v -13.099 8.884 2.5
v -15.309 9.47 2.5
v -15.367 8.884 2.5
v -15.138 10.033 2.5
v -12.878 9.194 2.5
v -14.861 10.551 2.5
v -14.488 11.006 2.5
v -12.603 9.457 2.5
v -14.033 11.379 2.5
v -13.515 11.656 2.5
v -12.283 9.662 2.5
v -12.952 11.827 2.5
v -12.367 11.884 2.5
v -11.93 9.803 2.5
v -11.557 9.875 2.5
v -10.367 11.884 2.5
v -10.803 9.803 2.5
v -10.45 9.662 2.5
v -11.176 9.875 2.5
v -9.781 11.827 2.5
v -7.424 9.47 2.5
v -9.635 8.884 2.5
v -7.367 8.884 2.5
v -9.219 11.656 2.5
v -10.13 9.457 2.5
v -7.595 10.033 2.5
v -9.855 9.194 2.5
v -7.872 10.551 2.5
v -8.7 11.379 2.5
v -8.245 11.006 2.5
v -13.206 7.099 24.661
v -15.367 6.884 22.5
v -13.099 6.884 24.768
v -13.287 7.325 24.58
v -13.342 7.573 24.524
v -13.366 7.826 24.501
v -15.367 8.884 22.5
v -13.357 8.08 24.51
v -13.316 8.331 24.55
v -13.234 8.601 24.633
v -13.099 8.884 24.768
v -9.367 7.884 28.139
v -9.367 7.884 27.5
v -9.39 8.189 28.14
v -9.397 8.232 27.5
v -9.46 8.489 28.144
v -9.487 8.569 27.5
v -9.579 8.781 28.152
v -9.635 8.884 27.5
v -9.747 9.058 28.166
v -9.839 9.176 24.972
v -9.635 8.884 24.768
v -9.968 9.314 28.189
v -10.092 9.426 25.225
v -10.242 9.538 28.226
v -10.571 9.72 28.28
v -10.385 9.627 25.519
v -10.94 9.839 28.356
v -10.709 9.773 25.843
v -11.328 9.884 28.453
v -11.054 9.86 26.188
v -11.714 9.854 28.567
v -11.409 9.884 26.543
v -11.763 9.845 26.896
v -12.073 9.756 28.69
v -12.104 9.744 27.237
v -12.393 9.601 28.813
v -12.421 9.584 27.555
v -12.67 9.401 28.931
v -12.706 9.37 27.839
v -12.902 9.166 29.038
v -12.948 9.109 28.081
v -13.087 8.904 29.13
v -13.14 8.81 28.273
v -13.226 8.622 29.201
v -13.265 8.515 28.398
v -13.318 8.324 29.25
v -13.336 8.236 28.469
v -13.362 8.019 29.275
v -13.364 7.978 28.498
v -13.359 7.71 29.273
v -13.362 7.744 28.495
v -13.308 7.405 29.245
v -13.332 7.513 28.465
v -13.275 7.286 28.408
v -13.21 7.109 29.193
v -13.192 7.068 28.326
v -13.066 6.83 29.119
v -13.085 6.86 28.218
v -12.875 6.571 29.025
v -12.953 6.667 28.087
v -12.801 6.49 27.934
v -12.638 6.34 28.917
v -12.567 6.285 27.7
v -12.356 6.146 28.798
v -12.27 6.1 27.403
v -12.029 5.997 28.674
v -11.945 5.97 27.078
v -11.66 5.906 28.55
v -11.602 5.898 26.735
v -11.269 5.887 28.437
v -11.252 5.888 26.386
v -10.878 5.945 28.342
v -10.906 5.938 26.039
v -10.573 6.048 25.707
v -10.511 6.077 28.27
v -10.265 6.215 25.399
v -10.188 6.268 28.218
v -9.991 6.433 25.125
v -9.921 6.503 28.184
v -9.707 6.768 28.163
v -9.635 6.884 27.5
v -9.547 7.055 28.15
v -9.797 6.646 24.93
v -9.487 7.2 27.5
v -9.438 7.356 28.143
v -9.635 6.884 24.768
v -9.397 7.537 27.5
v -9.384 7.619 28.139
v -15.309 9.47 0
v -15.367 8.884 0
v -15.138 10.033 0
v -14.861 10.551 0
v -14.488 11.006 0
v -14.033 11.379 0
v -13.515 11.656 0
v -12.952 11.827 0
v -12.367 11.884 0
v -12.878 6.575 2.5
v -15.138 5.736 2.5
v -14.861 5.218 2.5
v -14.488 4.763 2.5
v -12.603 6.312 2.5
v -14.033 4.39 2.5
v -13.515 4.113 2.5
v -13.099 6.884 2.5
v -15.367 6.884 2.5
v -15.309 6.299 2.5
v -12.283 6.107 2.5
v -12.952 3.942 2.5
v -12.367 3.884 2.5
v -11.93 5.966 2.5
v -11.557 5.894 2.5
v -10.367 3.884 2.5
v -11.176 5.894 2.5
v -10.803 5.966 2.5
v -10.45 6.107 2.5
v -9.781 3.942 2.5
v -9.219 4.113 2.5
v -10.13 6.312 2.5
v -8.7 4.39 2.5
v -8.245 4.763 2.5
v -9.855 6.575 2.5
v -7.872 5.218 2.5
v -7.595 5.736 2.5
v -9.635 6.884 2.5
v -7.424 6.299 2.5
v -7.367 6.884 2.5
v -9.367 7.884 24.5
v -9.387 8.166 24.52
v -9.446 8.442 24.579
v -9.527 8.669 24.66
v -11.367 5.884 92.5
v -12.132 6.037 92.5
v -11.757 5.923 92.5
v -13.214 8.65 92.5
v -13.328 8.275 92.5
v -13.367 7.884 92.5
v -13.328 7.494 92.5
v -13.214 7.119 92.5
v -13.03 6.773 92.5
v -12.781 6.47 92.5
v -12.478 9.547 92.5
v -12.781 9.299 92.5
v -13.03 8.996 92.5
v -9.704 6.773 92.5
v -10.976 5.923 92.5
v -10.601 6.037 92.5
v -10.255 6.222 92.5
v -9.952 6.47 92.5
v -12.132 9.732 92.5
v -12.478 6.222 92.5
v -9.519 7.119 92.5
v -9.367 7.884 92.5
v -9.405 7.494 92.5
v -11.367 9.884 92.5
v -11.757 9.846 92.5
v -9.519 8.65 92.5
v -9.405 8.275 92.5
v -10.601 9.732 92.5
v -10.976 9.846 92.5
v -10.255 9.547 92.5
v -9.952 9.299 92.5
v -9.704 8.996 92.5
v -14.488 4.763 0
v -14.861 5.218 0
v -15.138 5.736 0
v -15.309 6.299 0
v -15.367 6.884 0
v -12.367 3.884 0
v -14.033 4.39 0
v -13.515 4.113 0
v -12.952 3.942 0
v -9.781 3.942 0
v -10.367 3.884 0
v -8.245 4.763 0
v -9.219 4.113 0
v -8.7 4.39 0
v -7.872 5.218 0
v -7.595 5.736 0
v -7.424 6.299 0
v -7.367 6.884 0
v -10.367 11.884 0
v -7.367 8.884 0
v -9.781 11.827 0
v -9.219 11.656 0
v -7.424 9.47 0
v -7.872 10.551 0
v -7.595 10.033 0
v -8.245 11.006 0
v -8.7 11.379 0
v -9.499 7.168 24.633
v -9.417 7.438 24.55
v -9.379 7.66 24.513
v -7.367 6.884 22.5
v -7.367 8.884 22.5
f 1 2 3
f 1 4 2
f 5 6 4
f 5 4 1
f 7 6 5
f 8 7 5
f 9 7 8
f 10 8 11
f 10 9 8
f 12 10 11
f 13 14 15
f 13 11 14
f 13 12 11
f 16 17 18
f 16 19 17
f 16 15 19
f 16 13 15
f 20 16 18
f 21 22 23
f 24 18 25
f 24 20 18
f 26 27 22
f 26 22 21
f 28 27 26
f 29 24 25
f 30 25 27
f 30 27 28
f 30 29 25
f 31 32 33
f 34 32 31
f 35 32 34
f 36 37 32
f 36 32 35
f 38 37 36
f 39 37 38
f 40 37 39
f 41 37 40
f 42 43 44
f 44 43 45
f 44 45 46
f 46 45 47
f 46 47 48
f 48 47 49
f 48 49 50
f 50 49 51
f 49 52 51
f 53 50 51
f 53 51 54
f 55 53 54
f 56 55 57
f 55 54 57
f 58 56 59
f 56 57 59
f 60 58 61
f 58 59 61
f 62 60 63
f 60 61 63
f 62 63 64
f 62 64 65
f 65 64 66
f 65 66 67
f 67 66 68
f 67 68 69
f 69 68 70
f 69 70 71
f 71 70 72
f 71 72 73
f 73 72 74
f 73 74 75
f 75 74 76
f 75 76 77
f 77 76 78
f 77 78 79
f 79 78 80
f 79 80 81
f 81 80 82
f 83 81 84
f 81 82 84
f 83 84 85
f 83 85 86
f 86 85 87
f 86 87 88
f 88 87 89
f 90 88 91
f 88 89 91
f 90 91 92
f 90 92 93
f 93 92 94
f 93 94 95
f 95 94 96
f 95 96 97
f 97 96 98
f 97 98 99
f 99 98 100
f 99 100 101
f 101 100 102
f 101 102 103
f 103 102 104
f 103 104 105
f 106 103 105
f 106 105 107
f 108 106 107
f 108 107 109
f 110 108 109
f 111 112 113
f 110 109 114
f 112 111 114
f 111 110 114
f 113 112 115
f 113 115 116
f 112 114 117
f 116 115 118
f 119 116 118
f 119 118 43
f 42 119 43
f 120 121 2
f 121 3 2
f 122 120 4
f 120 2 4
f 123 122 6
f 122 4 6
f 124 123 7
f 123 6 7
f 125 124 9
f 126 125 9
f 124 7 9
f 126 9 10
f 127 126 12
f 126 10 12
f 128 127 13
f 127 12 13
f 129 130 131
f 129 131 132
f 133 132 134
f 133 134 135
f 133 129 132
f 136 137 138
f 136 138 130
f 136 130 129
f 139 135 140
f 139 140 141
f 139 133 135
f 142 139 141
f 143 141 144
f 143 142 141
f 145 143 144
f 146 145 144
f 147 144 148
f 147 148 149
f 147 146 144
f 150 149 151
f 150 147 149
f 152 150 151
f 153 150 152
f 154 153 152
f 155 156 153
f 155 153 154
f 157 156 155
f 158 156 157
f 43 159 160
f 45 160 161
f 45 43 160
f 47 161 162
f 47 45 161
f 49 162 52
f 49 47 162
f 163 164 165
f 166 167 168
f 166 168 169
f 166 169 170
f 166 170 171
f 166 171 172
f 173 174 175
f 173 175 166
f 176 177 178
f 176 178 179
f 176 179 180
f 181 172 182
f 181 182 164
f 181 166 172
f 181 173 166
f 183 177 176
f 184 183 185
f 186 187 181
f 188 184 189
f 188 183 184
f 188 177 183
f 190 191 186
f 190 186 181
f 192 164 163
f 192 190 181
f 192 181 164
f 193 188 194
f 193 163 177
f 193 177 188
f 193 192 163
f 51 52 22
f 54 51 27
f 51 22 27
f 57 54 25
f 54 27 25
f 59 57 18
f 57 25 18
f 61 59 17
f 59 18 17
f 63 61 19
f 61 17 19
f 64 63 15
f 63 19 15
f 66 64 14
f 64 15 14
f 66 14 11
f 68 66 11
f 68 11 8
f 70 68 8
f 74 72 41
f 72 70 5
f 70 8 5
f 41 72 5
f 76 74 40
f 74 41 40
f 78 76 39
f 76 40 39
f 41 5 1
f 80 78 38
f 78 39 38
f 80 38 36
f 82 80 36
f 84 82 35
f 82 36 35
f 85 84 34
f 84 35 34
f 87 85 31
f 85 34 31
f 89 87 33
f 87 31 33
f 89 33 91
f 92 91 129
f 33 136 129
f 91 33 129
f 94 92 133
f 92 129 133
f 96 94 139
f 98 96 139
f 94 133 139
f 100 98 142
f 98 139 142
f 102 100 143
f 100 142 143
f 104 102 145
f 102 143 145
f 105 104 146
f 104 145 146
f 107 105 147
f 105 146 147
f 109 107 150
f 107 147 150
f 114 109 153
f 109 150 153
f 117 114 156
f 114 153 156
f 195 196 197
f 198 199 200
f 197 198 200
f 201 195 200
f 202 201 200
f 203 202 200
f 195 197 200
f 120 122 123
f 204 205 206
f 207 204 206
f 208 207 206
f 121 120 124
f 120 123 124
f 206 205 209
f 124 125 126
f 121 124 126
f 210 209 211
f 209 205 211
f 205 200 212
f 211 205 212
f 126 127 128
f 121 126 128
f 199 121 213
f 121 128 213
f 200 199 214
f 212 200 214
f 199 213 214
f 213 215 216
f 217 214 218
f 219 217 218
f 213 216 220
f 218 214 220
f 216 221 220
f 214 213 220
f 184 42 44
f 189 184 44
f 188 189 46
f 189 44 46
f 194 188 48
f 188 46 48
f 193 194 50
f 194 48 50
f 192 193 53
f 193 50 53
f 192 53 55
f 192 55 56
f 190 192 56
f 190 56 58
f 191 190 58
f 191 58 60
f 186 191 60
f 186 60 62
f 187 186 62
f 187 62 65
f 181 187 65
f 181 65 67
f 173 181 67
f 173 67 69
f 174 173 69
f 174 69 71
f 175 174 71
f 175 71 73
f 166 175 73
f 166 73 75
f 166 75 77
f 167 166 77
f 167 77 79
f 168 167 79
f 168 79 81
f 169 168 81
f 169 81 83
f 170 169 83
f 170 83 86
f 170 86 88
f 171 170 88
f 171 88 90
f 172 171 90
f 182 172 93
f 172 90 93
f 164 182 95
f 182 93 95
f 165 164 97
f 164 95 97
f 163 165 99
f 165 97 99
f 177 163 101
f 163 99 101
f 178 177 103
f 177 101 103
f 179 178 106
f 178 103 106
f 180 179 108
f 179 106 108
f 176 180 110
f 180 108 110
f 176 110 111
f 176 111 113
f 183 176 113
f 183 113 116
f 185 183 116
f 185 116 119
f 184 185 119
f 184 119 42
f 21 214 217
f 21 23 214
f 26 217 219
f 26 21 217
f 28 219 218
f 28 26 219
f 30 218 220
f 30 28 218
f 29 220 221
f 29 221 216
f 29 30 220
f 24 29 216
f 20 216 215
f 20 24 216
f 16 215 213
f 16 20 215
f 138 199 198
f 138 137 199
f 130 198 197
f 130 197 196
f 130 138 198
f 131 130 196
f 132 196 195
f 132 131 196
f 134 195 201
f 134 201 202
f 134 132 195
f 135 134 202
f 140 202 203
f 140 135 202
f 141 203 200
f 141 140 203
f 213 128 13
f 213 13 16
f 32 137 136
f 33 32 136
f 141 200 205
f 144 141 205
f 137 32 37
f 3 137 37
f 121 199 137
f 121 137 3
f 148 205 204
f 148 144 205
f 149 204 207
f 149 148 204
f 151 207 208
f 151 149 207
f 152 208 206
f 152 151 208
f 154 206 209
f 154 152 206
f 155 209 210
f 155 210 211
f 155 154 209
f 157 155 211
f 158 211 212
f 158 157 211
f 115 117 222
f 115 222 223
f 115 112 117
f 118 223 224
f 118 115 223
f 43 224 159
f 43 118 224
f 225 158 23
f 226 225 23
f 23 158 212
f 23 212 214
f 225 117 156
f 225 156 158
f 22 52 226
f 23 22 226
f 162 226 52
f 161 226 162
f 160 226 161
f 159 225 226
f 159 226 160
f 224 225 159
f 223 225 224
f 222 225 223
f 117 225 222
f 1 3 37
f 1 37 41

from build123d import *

# Parameters (mm, degrees)
F0_W         = 8
F0_H         = 8
F1_DEPTH     = 2.5
F2_R         = 3
F3_R         = 2
F4_DEPTH     = 90
F5_W         = 8
F5_H         = 2
F6_DEPTH     = 25
F7_T4_DEPTH  = 32.7638593636
F7_S5_R      = 2
F7_T6_DEPTH  = 19
F7_T10_DEPTH = 32.7638593636
F7_S11_R     = 2
F7_T12_DEPTH = 19


# Not quite as in the source:
# - a fillet or chamfer that OpenCascade refuses, or shapes differently, is made with other operations: its cross-section is extruded or revolved along the edge and cut away or added


with BuildPart() as f1:
    # F0 (on Top) → F1 (new body)
    with BuildSketch(Plane.XY):
        with Locations((-11.3665966003, 7.8844996169)):
            Rectangle(F0_W, F0_H)
    extrude(amount=F1_DEPTH)

    # F2
    f2_edges = [f1.edges().sort_by_distance(p)[0] for p in [
        (-15.366597, 3.8845, 1.25),
        (-15.366597, 11.8845, 1.25),
        (-7.366597, 3.8845, 1.25),
        (-7.366597, 11.8845, 1.25),
    ]]
    fillet(f2_edges, radius=F2_R)

    # F3 (on face) → F4 (join)
    with BuildSketch(Plane.XY.offset(2.5)):
        with Locations((-11.3665966003, 7.8844996169)):
            Circle(F3_R)
    extrude(amount=F4_DEPTH)

    # F5 (on face) → F6 (join)
    with BuildSketch(Plane.XY.offset(2.5)):
        with Locations((-11.3665966003, 7.8844996169)):
            Rectangle(F5_W, F5_H)
    extrude(amount=F6_DEPTH)

    # F7: chamfer of 5 on 2 edges, made by hand


with BuildPart() as f7_tool2:
    # F7_s3 → F7_t4 (new body)
    with BuildSketch(Plane.XZ.offset(-24.2664292987)):
        with BuildLine():
            Line((-16.427256772, 21.4393398282), (-9.3059364285, 28.5606601718))
            Line((-9.3059364285, 28.5606601718), (-9.3059364285, 29.3106601718))
            ThreePointArc((-9.3059364285, 29.3106601718), (-12.3362665144, 28.25), (-15.3665966003, 28.25))
            Line((-15.3665966003, 28.25), (-16.1165966003, 27.5))
            ThreePointArc((-16.1165966003, 27.5), (-16.1165966003, 24.4696699141), (-17.177256772, 21.4393398282))
            Line((-17.177256772, 21.4393398282), (-16.427256772, 21.4393398282))
        make_face()
    extrude(amount=F7_T4_DEPTH)

    # F7_s5 → F7_t6 (cut, symmetric)
    with BuildSketch(Plane.XY.offset(25.4)):
        with Locations((-11.3665966003, 7.8844996169)):
            Circle(F7_S5_R)
    extrude(amount=F7_T6_DEPTH, both=True, mode=Mode.SUBTRACT)


with BuildPart() as f1_1:
    add(f1.part)

    # F7_t1: cut F7_tool2
    add(f7_tool2.part, mode=Mode.SUBTRACT)


with BuildPart() as f7_tool8:
    # F7_s9 → F7_t10 (new body)
    with BuildSketch(Plane.XZ.offset(8.4974300649)):
        with BuildLine():
            Line((-6.3059364285, 21.4393398282), (-13.427256772, 28.5606601718))
            Line((-13.427256772, 28.5606601718), (-13.427256772, 29.3106601718))
            ThreePointArc((-13.427256772, 29.3106601718), (-10.3969266861, 28.25), (-7.3665966003, 28.25))
            Line((-7.3665966003, 28.25), (-6.6165966003, 27.5))
            ThreePointArc((-6.6165966003, 27.5), (-6.6165966003, 24.4696699141), (-5.5559364285, 21.4393398282))
            Line((-5.5559364285, 21.4393398282), (-6.3059364285, 21.4393398282))
        make_face()
    extrude(amount=-F7_T10_DEPTH)

    # F7_s11 → F7_t12 (cut, symmetric)
    with BuildSketch(Plane.XY.offset(25.4)):
        with Locations((-11.3665966003, 7.8844996169)):
            Circle(F7_S11_R)
    extrude(amount=F7_T12_DEPTH, both=True, mode=Mode.SUBTRACT)


with BuildPart() as f1_2:
    add(f1_1.part)

    # F7_t7: cut F7_tool8
    add(f7_tool8.part, mode=Mode.SUBTRACT)


solid = f1_2.part
